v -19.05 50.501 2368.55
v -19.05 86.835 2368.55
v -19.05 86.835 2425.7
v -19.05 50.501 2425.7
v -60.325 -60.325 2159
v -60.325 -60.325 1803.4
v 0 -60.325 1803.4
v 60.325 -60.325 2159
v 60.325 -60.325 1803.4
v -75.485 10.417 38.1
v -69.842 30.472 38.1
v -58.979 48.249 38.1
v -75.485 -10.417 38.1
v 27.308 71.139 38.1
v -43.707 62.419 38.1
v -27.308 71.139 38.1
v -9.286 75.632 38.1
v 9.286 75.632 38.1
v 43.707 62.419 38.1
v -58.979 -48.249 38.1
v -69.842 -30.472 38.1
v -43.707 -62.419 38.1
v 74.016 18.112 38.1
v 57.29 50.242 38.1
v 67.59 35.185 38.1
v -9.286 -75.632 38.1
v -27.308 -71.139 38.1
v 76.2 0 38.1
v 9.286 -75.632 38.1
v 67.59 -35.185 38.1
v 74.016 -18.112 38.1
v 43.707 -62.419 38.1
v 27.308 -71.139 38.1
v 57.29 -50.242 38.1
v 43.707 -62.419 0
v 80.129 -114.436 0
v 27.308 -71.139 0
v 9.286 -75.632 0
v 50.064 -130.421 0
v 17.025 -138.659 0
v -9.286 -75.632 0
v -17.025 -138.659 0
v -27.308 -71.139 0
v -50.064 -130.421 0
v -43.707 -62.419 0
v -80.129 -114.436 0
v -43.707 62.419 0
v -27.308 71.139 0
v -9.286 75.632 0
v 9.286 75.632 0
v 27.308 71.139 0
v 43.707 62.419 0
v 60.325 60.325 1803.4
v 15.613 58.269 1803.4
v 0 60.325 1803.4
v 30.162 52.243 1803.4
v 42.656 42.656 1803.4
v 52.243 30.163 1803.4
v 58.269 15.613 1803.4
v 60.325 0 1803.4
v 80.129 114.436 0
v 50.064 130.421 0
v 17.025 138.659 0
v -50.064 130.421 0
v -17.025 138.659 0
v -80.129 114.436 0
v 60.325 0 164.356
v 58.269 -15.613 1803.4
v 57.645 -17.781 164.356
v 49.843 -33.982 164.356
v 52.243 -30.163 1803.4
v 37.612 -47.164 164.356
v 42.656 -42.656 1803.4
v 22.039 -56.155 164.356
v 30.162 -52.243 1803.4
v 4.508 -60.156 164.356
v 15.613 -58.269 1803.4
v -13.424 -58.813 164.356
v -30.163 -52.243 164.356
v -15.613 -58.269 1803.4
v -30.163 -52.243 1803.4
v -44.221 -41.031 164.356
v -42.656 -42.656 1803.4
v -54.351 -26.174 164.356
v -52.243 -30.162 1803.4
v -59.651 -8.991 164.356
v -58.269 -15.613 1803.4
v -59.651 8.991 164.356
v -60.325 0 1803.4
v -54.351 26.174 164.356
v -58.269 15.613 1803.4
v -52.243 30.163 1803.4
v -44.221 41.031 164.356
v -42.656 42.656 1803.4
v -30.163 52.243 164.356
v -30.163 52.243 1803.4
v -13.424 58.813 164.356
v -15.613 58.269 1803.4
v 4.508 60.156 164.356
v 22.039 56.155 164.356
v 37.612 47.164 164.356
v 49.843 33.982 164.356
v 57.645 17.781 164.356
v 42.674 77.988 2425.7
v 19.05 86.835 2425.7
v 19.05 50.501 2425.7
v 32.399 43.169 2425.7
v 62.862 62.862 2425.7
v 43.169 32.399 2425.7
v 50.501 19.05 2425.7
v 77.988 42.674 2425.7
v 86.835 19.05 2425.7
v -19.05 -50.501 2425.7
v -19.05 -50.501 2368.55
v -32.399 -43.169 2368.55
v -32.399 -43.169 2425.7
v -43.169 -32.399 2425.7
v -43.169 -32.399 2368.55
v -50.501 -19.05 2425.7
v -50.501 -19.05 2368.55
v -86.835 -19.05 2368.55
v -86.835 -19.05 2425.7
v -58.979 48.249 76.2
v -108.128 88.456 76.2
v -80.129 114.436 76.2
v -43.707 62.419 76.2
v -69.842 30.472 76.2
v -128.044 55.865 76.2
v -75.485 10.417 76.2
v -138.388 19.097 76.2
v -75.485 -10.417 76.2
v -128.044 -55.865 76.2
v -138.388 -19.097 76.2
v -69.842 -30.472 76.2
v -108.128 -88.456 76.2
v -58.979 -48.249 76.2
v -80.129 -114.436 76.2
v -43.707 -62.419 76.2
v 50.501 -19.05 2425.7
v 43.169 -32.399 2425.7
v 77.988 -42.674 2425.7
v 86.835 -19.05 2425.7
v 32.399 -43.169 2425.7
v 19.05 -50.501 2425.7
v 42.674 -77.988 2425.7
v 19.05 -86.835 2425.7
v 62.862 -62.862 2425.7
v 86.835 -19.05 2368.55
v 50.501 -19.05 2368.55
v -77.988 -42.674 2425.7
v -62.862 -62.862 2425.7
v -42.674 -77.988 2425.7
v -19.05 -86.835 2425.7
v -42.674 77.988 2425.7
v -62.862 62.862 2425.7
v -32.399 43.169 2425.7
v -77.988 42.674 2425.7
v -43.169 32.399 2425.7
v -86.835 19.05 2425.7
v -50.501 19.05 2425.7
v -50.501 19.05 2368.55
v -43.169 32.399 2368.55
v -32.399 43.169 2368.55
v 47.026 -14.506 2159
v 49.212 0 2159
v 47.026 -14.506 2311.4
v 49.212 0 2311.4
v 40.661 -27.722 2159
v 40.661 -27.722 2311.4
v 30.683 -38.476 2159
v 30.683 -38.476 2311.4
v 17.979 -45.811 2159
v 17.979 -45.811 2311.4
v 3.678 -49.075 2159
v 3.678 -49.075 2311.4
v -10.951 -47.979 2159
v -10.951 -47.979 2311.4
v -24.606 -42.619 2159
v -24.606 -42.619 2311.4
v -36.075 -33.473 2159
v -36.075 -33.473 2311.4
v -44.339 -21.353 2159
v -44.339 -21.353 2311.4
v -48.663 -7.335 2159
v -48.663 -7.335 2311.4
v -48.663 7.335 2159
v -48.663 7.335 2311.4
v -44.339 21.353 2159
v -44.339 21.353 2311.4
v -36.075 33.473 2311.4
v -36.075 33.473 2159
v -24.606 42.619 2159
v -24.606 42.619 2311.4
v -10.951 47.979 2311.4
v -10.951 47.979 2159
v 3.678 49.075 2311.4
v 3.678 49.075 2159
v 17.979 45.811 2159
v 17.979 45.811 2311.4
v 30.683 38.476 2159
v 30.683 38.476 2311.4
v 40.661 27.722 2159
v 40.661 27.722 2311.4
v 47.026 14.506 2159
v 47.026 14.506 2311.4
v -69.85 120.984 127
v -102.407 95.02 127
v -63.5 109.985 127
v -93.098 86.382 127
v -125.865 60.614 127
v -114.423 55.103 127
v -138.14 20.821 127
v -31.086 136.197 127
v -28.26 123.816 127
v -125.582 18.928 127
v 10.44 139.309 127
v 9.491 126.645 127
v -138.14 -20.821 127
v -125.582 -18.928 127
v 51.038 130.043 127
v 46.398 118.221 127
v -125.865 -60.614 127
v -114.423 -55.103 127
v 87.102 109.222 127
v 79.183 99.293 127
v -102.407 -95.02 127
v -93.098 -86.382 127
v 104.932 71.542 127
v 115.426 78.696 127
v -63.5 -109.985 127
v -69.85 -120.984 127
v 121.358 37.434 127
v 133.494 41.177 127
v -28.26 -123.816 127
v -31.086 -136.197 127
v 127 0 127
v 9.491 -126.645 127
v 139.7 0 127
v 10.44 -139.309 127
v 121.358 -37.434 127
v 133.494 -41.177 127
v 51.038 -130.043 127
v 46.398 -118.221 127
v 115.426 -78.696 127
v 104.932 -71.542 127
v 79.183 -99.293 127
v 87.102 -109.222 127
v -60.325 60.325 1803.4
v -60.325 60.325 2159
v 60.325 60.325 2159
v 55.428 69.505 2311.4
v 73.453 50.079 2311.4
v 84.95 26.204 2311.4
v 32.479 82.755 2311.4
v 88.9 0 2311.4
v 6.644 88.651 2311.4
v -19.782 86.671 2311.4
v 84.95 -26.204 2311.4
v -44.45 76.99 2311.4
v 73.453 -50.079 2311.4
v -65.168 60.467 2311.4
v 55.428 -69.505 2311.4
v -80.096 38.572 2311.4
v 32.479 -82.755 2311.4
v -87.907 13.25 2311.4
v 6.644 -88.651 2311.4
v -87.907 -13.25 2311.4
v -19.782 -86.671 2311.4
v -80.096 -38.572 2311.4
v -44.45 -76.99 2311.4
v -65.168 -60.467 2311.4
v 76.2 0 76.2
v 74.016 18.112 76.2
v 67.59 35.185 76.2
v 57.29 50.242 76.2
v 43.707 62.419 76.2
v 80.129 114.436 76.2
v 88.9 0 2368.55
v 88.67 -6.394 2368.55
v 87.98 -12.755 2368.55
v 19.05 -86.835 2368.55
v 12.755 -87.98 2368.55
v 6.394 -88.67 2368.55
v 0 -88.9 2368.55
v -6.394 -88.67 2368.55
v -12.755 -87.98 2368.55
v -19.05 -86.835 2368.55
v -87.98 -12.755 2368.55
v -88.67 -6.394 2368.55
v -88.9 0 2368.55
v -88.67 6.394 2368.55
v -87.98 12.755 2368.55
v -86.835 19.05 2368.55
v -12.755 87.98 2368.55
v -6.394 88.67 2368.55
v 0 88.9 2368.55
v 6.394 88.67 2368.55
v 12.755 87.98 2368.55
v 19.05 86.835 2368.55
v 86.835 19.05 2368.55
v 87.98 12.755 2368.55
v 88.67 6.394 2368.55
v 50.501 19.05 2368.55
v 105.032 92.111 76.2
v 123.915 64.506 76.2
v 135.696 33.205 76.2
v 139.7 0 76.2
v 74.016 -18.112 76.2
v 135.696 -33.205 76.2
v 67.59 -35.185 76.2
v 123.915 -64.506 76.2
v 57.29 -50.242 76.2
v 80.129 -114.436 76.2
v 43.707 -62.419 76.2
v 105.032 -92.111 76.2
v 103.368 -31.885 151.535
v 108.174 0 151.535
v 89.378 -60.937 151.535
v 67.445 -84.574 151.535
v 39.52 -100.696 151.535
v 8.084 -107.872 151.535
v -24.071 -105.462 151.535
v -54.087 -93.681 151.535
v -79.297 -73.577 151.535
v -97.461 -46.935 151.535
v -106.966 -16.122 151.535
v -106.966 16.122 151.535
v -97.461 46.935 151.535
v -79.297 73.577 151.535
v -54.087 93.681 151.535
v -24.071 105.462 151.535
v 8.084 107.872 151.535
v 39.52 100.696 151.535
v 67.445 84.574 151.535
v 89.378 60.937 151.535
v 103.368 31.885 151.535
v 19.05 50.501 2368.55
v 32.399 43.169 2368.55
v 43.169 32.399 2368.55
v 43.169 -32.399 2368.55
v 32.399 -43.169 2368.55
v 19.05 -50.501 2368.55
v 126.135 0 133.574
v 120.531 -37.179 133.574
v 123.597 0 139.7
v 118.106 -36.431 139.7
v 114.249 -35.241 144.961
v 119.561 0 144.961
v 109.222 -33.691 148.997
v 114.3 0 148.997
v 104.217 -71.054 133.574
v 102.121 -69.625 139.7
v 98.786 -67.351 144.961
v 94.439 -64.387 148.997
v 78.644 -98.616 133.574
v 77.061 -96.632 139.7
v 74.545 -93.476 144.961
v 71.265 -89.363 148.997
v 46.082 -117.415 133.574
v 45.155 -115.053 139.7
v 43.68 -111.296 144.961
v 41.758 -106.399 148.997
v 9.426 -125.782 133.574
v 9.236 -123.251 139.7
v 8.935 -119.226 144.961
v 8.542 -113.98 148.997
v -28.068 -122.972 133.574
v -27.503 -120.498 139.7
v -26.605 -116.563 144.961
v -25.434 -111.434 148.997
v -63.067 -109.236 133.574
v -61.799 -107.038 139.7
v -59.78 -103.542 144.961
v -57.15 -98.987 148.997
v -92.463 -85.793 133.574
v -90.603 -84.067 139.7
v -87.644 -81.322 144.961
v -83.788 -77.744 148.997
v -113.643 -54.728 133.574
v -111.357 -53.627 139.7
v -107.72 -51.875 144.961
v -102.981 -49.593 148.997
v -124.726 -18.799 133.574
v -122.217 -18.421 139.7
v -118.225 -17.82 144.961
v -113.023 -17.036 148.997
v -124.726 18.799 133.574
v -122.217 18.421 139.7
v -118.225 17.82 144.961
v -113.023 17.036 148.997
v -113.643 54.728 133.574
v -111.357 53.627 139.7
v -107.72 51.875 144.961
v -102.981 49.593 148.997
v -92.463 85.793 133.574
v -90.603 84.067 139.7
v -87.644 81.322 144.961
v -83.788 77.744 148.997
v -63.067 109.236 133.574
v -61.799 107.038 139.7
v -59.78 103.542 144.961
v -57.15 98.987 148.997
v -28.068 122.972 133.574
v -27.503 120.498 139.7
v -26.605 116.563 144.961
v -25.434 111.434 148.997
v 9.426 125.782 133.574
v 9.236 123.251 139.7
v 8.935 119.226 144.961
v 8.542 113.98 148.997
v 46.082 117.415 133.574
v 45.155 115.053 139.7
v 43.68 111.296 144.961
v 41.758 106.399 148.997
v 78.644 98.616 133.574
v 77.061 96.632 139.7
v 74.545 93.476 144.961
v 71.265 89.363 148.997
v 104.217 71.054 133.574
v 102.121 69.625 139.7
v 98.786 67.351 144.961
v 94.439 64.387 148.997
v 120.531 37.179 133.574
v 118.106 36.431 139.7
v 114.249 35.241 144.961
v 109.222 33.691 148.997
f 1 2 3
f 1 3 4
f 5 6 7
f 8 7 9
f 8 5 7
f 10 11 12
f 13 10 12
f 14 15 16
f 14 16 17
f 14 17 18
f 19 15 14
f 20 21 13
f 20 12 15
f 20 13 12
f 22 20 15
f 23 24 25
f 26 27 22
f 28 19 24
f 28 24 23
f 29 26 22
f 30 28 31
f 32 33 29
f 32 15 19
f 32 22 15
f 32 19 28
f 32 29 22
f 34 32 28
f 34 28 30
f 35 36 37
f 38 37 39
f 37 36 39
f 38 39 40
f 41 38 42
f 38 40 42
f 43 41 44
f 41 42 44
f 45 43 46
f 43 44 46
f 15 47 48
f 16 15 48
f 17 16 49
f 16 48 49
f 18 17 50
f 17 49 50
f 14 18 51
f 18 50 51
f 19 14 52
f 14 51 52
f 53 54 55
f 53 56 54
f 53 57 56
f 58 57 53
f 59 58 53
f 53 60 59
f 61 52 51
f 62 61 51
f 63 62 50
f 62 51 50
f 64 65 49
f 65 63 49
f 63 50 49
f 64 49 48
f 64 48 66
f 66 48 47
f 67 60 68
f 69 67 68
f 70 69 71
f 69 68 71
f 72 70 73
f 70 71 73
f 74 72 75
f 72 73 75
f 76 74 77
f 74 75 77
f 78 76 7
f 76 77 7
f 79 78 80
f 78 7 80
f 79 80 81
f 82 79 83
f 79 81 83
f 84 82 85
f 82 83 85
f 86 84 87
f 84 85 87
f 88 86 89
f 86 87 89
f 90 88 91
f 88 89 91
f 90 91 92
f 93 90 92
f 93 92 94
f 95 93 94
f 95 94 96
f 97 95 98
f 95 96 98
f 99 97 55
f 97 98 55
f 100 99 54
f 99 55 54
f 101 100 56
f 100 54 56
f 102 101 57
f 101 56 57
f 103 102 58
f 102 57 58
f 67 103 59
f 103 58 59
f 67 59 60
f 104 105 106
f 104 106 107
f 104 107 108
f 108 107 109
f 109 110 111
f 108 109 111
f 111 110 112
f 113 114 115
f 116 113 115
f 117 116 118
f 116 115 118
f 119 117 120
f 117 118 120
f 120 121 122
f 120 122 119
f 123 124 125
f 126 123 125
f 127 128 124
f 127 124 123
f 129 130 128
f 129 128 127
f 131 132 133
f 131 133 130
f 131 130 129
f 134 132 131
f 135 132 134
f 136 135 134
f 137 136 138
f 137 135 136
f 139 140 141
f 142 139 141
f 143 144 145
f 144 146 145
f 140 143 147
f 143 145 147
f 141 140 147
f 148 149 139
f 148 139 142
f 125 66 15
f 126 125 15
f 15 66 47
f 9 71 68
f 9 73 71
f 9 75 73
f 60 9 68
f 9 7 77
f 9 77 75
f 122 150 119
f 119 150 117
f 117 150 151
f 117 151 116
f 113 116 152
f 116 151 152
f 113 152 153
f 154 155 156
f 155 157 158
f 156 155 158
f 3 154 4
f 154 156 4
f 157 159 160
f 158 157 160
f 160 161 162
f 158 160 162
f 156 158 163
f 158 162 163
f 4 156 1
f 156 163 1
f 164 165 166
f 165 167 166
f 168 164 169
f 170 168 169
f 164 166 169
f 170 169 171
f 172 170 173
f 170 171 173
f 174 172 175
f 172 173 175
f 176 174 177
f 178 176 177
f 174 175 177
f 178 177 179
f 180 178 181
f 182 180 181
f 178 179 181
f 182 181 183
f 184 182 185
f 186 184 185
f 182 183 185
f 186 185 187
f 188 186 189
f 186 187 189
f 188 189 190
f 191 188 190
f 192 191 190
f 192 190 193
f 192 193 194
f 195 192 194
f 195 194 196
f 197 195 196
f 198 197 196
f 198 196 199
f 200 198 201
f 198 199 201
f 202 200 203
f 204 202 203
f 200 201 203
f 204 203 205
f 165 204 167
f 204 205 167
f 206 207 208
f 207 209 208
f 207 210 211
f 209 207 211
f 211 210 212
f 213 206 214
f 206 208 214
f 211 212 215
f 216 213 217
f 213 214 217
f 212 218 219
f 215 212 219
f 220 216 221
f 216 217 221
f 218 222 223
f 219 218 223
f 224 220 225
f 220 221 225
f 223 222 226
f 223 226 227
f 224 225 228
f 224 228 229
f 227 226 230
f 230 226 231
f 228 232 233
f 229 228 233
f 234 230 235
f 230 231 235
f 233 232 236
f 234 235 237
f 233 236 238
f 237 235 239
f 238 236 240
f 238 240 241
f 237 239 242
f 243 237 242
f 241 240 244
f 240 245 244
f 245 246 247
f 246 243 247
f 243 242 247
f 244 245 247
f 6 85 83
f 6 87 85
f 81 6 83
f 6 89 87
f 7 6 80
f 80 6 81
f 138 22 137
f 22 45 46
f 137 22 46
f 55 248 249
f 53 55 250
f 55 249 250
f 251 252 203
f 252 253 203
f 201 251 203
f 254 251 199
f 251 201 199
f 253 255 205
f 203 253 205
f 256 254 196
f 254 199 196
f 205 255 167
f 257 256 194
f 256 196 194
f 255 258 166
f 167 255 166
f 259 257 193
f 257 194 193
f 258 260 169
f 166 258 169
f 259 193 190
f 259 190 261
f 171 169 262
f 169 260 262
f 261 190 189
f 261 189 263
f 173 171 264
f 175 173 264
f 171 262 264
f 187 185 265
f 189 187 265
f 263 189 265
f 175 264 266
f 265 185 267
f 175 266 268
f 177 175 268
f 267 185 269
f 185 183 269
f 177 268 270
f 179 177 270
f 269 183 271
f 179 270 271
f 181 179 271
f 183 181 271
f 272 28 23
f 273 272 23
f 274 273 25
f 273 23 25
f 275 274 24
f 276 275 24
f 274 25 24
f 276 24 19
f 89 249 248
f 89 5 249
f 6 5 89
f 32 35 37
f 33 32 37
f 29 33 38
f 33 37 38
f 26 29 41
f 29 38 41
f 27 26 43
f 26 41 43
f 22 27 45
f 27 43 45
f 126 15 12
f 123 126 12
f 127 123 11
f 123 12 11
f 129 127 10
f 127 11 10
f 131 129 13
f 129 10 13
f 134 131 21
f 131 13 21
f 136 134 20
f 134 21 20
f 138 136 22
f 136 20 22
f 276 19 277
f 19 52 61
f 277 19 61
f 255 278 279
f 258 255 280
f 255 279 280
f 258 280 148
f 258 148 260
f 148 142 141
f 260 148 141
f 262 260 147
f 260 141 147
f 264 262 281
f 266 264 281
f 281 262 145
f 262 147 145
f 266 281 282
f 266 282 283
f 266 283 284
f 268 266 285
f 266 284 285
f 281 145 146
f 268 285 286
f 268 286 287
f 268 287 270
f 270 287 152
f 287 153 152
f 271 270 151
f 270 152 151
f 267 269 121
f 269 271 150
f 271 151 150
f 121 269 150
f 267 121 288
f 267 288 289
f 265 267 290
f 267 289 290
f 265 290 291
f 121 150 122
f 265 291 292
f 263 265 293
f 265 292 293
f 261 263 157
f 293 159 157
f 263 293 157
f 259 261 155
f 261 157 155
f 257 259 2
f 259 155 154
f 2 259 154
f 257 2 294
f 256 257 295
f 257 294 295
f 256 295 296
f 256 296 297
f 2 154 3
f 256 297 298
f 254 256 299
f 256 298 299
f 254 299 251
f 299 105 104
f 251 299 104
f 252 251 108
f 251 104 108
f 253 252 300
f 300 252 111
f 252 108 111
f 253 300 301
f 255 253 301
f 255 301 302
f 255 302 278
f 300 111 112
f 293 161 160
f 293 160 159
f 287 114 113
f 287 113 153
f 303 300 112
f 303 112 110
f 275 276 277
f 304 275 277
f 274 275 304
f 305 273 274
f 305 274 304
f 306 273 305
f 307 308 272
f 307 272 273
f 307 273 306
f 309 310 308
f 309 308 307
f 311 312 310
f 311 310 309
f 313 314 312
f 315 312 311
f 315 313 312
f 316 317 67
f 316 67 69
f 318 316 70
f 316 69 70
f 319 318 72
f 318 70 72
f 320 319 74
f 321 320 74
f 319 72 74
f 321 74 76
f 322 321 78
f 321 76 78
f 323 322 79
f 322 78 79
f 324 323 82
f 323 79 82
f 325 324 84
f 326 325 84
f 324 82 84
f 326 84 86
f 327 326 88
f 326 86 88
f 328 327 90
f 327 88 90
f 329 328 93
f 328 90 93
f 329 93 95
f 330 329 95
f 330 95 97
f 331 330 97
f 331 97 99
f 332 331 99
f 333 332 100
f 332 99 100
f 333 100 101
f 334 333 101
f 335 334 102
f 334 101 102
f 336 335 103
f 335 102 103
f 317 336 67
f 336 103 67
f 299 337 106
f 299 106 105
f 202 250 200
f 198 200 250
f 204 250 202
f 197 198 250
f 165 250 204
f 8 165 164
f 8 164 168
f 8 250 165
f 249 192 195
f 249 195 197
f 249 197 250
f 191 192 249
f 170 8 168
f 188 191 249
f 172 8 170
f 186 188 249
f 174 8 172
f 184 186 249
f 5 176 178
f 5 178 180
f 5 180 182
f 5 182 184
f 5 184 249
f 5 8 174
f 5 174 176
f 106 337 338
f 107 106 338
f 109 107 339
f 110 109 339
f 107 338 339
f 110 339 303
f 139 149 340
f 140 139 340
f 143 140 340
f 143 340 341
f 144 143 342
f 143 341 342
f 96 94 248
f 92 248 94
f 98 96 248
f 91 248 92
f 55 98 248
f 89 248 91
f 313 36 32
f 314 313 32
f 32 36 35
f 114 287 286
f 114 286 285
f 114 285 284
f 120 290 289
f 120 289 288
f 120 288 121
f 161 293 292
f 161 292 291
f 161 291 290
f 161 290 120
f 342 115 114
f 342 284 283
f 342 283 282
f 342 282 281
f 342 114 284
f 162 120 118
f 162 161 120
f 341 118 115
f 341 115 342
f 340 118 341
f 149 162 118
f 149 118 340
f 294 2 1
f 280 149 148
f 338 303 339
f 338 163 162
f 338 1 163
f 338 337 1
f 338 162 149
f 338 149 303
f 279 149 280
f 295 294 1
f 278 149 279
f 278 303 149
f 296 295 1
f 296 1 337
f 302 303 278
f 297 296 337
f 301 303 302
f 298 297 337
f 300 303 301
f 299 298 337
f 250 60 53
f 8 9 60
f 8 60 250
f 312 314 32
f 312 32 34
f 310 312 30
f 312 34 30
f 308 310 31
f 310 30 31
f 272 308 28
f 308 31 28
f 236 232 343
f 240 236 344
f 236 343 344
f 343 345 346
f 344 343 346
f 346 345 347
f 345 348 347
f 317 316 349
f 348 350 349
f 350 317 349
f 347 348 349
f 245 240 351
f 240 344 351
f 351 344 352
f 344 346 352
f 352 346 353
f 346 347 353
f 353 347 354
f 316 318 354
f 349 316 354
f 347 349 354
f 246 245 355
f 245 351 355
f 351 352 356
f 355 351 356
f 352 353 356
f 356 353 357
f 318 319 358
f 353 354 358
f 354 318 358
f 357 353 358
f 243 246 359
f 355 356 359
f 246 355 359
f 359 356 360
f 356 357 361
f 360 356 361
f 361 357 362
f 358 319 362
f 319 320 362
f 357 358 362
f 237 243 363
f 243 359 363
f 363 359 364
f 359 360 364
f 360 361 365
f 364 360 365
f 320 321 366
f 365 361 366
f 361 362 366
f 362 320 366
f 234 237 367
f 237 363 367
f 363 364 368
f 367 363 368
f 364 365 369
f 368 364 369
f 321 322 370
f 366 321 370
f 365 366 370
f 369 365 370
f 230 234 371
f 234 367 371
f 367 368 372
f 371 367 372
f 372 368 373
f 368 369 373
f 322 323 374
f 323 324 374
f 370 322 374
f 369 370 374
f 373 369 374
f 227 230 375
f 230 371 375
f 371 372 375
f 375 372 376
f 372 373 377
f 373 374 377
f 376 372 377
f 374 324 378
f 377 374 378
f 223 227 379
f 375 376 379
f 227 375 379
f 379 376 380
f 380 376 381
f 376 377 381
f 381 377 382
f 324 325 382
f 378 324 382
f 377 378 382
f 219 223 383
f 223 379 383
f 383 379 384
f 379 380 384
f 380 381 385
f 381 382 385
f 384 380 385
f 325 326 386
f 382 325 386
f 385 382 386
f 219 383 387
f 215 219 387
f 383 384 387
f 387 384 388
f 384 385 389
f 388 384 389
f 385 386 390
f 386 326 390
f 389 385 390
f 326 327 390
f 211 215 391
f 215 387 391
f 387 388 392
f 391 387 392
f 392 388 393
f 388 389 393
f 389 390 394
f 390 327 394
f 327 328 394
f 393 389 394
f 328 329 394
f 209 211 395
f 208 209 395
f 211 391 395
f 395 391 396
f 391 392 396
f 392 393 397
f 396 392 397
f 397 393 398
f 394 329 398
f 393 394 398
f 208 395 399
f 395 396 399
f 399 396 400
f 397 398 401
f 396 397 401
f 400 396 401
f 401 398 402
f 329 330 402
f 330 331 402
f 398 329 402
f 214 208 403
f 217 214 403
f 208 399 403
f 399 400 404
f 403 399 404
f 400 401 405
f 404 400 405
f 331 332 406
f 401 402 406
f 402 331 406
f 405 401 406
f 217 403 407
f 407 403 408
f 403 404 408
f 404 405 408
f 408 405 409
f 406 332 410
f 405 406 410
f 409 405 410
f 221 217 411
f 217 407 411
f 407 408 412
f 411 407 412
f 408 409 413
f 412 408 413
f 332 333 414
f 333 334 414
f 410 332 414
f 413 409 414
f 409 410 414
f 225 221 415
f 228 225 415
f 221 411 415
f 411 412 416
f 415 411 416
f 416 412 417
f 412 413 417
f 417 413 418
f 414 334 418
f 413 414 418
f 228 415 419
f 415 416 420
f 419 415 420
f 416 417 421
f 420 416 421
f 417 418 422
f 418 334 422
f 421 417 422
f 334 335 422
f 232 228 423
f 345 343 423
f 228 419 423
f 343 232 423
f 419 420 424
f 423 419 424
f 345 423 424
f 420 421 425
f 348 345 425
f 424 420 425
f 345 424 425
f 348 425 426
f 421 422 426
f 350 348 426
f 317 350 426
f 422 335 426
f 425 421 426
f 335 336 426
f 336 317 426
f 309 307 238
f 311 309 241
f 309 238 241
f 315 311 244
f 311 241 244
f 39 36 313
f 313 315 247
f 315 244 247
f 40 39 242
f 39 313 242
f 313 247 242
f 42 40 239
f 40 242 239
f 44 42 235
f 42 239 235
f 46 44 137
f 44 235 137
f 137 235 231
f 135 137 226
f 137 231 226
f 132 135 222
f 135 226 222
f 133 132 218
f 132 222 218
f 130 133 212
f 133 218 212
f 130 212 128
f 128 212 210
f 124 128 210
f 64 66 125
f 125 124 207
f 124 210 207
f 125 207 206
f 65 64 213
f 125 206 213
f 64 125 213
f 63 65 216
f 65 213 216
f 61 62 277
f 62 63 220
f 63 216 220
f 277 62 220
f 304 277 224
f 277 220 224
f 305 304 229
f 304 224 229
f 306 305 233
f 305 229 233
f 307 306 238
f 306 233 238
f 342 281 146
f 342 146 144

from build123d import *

# Parameters (mm, degrees)
F3_DEPTH        = 38.1
F4_DEPTH        = 76.2
F5_DEPTH        = 60.325
F8_DEPTH        = 57.15
F8_COPIES_COUNT = 4


# Not quite as in the source:
# - a pattern or mirror of a feature is missing from the dataset's text; its kind, count and spacing are read off the source's solid


with BuildPart() as f1:
    # F0 (on Front) → F1 (revolve)
    with BuildSketch(Plane.XZ):
        with BuildLine():
            Line((0, 1803.4), (0, 0))
            Line((0, 0), (139.7, 0))
            Line((139.7, 0), (139.7, 127))
            Line((139.7, 127), (127, 127))
            ThreePointArc((127, 127), (121.7511748434, 142.4625402968), (108.1740037456, 151.5345159877))
            Line((108.1740037456, 151.5345159877), (60.325, 164.3556179))
            Line((60.325, 164.3556179), (60.325, 1803.4))
            Line((60.325, 1803.4), (0, 1803.4))
        make_face()
    revolve(axis=Axis((0, 0, 901.7), (0, 0, -1)))

    # F2 (on face) → F3 (cut)
    with BuildSketch(Plane(origin=(0, 0, 0), x_dir=(1, 0, 0), z_dir=(0, 0, -1))):
        with BuildLine():
            ThreePointArc((43.7065244499, -62.4193857748), (67.5902254882, -35.1852443285), (76.2, 0))
            ThreePointArc((76.2, 0), (67.5902254882, 35.1852443285), (43.7065244499, 62.4193857748))
            ThreePointArc((43.7065244499, 62.4193857748), (0, 76.2), (-43.7065244499, 62.4193857748))
            ThreePointArc((-43.7065244499, 62.4193857748), (-76.2, 0), (-43.7065244499, -62.4193857748))
            ThreePointArc((-43.7065244499, -62.4193857748), (0, -76.2), (43.7065244499, -62.4193857748))
        make_face()
    extrude(amount=-F3_DEPTH, mode=Mode.SUBTRACT)

    # F2 (on face) → F4 (cut)
    with BuildSketch(Plane(origin=(0, 0, 0), x_dir=(1, 0, 0), z_dir=(0, 0, -1))):
        with BuildLine():
            ThreePointArc((-43.7065244499, -62.4193857748), (-76.2, 0), (-43.7065244499, 62.4193857748))
            Line((-43.7065244499, 62.4193857748), (-80.1286281582, 114.4355405872))
            ThreePointArc((-80.1286281582, 114.4355405872), (-139.7, 0), (-80.1286281582, -114.4355405872))
            Line((-80.1286281582, -114.4355405872), (-43.7065244499, -62.4193857748))
        make_face()
        with BuildLine():
            ThreePointArc((43.7065244499, 62.4193857748), (67.5902254882, 35.1852443285), (76.2, 0))
            ThreePointArc((76.2, 0), (67.5902254882, -35.1852443285), (43.7065244499, -62.4193857748))
            Line((43.7065244499, -62.4193857748), (80.1286281582, -114.4355405872))
            ThreePointArc((80.1286281582, -114.4355405872), (123.915413395, -64.5062812689), (139.7, 0))
            ThreePointArc((139.7, 0), (123.915413395, 64.5062812689), (80.1286281582, 114.4355405872))
            Line((80.1286281582, 114.4355405872), (43.7065244499, 62.4193857748))
        make_face()
    extrude(amount=-F4_DEPTH, mode=Mode.SUBTRACT)

    # F0 (on Front) → F5 (join, symmetric)
    with BuildSketch(Plane.XZ):
        Polygon((-60.325, 1803.4), (0, 1803.4), (60.325, 1803.4), (60.325, 2159), (49.2125, 2159), (0, 2159), (-60.325, 2159), align=None)
    extrude(amount=F5_DEPTH, both=True)

    # F0 (on Front) → F6 (revolve)
    with BuildSketch(Plane.XZ):
        Polygon((0, 2159), (49.2125, 2159), (49.2125, 2311.4), (88.9, 2311.4), (88.9, 2425.7), (53.975, 2425.7), (53.975, 2368.55), (0, 2368.55), align=None)
    revolve(axis=Axis((0, 0, 2263.775), (0, 0, -1)))

    # F7 (on face) → F8 (cut, through all)
    with BuildSketch(Plane.XY.offset(2425.7)):
        with BuildLine():
            ThreePointArc((53.975, 0), (53.0995163948, -9.6820443933), (50.5014665629, -19.05))
            Line((50.5014665629, -19.05), (86.834944003, -19.05))
            ThreePointArc((86.834944003, -19.05), (88.3822281962, -9.5808005442), (88.9, 0))
            ThreePointArc((88.9, 0), (88.3822281962, 9.5808005442), (86.834944003, 19.05))
            Line((86.834944003, 19.05), (50.5014665629, 19.05))
            ThreePointArc((50.5014665629, 19.05), (53.0995163948, 9.6820443933), (53.975, 0))
        make_face()
    f8 = extrude(amount=-F8_DEPTH, mode=Mode.SUBTRACT)

    # F8_copies: F8 ×4 about axis
    f8_copies_axis = Axis((0, 0, 0), (0, 0, 1))
    for i in range(1, F8_COPIES_COUNT):
        add(f8.rotate(f8_copies_axis, i * 360 / F8_COPIES_COUNT), mode=Mode.SUBTRACT)


solid = f1.part
